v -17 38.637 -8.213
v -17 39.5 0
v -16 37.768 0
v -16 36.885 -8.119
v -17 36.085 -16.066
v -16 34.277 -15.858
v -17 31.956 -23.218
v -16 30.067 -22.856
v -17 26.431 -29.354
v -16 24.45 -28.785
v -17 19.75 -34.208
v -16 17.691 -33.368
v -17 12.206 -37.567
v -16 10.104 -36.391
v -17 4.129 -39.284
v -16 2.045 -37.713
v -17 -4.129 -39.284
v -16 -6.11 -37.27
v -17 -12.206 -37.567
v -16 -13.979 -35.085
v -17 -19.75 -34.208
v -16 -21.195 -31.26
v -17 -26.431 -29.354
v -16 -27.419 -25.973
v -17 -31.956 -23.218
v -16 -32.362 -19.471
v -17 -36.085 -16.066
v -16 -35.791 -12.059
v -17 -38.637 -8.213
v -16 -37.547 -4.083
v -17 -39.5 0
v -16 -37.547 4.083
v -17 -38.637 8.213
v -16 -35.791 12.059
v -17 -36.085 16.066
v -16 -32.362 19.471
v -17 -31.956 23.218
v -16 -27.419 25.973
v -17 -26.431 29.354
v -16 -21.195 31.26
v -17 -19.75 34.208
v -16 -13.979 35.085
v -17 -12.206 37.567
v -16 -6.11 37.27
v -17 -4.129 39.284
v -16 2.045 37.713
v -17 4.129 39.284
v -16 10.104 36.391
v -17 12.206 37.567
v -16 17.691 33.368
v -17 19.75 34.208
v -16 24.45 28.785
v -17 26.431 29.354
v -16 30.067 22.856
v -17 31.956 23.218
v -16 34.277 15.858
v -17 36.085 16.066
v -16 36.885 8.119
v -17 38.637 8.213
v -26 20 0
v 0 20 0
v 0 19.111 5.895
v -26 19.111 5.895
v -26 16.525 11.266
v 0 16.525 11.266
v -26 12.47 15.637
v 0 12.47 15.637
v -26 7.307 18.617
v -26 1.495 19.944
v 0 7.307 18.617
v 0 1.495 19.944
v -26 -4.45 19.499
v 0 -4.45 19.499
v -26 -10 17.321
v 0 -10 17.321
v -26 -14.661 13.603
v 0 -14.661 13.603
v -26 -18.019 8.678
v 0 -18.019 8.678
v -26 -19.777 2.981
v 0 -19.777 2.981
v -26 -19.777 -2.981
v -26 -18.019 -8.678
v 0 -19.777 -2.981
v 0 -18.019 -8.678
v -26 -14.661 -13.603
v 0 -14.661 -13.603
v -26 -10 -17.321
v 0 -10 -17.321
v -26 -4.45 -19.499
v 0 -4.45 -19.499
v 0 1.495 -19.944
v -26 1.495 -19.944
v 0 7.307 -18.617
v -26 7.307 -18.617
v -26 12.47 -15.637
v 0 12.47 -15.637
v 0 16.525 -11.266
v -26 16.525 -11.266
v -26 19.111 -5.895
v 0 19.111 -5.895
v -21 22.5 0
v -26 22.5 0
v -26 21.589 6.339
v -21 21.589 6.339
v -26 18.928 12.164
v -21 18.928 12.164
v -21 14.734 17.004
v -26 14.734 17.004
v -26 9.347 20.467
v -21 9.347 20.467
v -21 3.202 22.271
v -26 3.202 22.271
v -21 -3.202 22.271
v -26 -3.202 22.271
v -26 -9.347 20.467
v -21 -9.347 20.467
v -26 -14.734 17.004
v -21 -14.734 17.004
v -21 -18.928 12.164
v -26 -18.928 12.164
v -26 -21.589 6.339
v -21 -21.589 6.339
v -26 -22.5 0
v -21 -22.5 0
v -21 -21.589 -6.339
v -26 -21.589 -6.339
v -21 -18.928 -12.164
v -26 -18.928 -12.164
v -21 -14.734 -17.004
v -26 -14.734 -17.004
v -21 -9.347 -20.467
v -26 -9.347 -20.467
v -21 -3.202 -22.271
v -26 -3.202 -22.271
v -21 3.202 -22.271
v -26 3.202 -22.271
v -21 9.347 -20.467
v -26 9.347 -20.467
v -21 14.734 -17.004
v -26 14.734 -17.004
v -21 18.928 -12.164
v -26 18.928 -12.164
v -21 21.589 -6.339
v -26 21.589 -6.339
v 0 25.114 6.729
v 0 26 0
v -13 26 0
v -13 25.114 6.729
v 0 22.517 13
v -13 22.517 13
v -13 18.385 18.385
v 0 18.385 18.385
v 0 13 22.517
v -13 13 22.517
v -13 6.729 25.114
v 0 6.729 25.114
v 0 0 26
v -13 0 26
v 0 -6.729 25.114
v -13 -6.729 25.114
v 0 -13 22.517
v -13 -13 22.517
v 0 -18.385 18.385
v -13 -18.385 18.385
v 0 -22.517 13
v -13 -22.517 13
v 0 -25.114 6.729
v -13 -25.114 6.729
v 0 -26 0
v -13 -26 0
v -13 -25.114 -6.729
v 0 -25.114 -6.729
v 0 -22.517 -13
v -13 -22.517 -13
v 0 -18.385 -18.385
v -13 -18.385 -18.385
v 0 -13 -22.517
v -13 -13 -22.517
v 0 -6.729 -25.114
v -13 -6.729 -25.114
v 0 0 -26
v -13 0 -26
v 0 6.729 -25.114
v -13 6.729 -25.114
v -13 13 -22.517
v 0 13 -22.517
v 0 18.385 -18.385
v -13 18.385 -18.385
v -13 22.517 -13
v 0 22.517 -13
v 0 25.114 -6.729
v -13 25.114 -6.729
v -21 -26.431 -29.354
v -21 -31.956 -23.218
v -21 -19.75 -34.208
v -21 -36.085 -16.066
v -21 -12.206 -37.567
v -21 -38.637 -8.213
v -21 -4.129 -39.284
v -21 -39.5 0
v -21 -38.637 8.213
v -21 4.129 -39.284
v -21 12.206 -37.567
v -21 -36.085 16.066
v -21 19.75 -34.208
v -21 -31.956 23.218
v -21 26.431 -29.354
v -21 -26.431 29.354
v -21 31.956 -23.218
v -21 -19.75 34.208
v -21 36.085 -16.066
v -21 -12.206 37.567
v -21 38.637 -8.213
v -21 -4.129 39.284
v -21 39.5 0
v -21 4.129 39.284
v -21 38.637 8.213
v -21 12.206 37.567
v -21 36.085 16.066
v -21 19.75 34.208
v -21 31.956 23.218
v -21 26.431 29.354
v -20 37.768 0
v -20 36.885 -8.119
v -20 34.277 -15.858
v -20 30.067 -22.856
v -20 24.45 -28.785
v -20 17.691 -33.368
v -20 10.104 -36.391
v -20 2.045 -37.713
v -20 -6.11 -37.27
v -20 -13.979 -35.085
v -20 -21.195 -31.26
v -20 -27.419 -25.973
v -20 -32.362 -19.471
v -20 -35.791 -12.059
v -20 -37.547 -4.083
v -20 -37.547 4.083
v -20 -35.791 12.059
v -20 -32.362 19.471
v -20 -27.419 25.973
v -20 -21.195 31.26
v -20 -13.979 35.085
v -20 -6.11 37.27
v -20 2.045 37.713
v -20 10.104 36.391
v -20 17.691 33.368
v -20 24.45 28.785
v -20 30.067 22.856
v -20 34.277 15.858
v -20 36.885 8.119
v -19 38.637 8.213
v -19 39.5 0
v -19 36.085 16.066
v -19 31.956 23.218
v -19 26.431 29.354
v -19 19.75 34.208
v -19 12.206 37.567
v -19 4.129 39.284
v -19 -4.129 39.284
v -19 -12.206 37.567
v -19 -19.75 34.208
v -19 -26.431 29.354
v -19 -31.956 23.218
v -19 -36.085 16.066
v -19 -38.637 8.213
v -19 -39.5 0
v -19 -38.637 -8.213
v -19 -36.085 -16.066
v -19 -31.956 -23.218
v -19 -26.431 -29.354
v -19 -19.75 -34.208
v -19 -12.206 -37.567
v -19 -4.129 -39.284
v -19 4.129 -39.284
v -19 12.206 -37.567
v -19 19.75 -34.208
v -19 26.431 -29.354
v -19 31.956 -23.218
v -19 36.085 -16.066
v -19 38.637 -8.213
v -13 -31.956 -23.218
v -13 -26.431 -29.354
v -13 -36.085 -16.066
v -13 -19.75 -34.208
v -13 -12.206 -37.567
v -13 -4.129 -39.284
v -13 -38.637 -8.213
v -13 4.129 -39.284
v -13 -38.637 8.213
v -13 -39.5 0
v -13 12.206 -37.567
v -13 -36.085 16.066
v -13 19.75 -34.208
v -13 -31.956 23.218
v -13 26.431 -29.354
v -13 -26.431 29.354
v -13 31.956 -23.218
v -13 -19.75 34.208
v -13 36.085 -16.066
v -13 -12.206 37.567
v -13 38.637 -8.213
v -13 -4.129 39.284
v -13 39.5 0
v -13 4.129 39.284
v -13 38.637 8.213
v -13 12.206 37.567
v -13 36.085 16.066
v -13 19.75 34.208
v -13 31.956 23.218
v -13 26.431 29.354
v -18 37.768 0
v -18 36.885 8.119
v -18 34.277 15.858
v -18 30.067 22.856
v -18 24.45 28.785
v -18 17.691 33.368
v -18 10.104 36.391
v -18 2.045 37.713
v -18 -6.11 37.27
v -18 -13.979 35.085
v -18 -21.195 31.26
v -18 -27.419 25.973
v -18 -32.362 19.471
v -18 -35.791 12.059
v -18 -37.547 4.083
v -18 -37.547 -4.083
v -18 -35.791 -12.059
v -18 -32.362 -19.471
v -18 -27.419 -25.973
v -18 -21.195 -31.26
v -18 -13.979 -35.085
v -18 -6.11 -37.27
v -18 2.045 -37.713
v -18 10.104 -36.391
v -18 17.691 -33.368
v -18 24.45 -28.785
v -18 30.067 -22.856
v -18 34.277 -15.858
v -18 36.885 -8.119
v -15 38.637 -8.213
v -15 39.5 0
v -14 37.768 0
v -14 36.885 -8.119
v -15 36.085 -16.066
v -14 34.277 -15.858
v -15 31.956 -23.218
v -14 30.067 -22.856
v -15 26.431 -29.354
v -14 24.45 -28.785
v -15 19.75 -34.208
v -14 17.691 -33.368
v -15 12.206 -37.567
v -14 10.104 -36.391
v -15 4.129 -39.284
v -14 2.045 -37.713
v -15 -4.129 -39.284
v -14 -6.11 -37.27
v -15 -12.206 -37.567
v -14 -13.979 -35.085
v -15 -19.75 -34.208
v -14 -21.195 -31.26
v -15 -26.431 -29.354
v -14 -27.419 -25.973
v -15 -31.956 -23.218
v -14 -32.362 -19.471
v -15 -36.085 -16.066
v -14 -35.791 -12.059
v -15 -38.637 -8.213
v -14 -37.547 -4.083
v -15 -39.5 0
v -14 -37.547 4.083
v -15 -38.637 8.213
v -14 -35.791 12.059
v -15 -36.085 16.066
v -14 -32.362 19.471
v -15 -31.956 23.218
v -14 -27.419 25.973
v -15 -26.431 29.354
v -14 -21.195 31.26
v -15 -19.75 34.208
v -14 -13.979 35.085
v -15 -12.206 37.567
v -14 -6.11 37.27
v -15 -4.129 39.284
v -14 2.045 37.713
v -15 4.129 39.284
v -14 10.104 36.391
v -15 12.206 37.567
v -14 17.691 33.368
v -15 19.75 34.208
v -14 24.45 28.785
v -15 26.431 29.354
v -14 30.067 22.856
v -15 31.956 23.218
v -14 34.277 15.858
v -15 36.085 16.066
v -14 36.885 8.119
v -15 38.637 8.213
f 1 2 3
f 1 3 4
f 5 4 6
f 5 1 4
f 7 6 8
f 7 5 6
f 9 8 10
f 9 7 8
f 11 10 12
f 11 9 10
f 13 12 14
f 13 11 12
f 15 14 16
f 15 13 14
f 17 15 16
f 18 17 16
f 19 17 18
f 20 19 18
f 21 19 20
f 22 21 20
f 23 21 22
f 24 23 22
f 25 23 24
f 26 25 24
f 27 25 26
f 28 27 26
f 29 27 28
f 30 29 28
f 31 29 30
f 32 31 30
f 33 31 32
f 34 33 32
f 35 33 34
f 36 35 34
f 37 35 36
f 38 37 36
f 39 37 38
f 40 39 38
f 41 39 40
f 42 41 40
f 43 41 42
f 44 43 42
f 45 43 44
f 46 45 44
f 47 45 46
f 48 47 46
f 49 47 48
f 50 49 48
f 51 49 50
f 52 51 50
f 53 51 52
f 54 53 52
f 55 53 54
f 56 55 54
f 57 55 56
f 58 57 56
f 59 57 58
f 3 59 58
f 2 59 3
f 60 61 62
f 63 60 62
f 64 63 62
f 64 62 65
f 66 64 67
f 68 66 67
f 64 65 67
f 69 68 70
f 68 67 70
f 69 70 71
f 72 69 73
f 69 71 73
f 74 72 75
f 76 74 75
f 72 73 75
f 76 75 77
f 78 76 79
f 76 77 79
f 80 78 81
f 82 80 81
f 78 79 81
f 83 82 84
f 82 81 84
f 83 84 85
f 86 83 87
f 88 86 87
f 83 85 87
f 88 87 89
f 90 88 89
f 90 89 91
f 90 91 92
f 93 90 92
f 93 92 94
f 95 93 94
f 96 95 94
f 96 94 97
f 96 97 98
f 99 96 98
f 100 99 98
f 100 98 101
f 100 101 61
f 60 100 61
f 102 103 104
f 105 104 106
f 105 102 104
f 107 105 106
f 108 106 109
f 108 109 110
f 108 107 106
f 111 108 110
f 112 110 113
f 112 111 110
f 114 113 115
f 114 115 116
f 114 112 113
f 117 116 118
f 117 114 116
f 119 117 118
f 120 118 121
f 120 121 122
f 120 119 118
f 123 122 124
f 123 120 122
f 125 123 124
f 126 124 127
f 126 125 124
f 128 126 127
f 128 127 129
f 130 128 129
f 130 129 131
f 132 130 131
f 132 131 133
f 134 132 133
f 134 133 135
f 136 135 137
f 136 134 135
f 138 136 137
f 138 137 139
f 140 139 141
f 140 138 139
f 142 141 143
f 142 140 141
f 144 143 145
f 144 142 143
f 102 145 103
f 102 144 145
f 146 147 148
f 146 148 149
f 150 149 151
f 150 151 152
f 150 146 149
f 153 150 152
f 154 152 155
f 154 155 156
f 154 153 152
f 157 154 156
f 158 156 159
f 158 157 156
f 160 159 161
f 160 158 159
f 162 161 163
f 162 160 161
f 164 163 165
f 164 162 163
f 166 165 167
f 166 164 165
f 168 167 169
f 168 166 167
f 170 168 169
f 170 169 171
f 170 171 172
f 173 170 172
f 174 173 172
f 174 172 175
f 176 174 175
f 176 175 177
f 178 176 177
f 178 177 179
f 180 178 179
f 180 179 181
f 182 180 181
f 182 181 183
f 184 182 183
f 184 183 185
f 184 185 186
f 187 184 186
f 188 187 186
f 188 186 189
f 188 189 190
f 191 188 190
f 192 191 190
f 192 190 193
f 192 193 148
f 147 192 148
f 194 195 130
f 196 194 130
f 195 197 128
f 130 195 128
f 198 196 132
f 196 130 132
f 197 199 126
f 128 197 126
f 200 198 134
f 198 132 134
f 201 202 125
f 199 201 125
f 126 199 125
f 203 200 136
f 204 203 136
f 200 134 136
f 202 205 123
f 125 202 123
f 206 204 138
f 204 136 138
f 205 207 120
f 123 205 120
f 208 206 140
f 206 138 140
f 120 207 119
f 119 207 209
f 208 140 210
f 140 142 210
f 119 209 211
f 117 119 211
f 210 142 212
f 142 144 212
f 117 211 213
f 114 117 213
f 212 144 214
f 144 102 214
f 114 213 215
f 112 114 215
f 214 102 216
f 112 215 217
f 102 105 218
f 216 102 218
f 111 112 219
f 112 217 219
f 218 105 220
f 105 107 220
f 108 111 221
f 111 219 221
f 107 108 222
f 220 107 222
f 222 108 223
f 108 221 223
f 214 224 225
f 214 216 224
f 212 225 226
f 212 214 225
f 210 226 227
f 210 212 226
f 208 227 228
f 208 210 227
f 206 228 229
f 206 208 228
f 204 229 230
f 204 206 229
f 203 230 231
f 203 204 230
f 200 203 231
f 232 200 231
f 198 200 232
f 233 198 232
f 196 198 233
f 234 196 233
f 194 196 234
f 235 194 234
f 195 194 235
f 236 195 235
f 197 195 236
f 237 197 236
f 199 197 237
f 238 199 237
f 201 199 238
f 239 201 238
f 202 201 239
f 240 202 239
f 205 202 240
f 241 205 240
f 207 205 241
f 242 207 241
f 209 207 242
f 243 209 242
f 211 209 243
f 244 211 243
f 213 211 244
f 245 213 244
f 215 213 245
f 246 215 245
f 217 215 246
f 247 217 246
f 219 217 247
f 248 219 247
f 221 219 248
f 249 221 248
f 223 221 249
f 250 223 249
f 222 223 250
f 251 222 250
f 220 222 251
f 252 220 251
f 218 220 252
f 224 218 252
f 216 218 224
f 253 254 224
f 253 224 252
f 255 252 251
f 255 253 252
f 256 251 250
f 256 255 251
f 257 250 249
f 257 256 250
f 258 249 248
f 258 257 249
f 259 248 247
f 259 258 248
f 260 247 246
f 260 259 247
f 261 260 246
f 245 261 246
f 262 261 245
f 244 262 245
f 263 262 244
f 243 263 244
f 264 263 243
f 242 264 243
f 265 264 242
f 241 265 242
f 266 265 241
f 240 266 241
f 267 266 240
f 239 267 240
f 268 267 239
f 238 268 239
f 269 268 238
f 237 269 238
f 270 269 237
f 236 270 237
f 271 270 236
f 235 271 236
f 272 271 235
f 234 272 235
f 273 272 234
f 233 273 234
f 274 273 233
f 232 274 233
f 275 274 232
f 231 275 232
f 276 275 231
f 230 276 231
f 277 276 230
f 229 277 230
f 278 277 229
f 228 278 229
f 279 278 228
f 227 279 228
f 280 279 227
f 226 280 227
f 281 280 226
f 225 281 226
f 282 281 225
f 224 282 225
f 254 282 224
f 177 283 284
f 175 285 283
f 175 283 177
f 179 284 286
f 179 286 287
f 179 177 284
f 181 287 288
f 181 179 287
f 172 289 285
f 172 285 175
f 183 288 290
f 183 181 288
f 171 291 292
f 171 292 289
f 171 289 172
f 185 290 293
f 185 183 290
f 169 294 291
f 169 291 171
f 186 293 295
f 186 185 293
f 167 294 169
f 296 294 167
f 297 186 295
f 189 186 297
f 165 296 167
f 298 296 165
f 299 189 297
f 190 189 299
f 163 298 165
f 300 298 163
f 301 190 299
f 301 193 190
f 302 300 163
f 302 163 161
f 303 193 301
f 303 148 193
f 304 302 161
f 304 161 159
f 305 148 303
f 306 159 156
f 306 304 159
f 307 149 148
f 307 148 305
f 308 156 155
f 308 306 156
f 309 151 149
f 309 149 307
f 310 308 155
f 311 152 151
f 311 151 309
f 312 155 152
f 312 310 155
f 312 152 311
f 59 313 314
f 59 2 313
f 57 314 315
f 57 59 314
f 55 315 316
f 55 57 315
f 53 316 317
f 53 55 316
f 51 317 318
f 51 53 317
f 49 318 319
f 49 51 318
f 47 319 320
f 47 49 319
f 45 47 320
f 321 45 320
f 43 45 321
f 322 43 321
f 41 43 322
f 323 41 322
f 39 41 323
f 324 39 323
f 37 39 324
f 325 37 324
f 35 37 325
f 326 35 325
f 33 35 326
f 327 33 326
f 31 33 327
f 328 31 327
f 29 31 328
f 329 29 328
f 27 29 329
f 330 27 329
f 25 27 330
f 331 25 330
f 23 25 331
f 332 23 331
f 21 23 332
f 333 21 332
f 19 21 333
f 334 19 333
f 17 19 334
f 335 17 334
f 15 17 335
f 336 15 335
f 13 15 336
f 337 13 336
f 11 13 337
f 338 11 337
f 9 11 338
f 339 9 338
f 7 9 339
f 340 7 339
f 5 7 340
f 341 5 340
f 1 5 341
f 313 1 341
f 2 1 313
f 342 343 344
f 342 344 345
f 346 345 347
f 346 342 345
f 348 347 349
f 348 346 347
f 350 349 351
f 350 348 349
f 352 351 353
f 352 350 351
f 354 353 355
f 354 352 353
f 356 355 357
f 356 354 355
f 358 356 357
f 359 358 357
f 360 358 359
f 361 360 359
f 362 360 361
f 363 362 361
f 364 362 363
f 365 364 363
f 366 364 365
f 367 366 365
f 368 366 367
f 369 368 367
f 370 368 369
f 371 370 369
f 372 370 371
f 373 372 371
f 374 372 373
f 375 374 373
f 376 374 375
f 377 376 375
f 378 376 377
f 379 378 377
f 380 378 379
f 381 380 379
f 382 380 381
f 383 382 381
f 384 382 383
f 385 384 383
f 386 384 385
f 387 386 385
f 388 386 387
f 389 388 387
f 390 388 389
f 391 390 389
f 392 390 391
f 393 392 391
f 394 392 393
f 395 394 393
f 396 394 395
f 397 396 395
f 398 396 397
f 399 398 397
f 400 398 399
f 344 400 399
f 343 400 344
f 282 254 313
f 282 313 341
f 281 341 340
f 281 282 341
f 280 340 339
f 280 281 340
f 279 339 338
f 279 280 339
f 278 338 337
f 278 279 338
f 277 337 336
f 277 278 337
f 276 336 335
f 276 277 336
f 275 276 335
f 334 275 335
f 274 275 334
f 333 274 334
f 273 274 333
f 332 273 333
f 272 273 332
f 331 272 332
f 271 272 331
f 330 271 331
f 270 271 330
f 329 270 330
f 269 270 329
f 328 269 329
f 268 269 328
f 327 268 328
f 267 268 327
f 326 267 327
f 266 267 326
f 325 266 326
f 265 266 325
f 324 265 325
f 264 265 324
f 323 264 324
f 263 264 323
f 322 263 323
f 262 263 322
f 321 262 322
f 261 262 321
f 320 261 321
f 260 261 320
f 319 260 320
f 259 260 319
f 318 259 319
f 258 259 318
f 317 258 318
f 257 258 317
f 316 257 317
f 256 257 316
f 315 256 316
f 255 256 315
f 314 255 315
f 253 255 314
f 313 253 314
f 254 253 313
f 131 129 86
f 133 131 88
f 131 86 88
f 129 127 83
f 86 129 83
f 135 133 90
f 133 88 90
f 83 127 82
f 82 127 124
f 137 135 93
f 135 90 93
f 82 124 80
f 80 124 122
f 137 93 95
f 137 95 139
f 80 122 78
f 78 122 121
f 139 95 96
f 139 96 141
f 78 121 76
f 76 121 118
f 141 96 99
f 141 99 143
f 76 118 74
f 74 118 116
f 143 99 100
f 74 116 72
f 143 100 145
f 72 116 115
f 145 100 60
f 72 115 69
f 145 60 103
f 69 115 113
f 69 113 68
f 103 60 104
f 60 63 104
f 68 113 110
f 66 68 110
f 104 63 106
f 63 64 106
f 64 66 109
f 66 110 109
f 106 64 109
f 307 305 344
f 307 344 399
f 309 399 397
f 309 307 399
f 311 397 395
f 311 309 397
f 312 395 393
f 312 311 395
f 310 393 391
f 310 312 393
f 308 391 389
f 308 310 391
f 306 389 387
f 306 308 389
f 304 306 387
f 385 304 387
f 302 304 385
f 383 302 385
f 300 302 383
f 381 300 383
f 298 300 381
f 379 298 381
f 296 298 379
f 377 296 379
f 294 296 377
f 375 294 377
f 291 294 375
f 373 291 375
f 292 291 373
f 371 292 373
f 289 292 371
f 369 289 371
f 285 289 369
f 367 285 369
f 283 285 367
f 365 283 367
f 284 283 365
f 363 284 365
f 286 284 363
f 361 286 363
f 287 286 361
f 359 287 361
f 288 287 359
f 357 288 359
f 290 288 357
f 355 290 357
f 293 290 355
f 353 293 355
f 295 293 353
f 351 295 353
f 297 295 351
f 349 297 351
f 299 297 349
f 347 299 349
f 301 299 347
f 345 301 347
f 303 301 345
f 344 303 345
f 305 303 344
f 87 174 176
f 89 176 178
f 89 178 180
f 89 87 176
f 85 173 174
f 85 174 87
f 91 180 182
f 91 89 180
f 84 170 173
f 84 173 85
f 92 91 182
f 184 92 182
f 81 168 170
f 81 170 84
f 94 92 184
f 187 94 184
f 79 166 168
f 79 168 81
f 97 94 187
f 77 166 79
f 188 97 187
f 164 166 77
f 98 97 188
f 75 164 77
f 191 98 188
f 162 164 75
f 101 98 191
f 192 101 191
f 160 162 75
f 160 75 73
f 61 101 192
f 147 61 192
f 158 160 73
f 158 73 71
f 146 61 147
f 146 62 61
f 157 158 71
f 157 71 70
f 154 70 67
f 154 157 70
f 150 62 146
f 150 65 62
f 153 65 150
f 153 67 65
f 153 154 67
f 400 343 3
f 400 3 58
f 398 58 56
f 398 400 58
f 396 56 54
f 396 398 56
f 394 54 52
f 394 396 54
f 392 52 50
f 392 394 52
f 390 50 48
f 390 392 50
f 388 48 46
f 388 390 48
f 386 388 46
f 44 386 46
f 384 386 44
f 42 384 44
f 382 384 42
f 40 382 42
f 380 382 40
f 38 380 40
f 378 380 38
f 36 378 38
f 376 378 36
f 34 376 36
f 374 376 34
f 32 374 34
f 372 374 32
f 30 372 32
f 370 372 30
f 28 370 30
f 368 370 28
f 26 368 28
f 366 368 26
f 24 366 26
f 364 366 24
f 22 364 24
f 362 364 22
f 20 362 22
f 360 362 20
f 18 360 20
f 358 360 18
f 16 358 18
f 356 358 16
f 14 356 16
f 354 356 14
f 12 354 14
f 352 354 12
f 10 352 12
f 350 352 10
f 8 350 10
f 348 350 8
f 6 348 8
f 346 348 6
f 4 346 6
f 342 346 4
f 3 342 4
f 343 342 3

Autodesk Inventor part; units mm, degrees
ref_plane "YZ Plane" through (0, 0, 0) normal (1, 0, 0) x (0, 1, 0)
ref_plane "XZ Plane" through (0, 0, 0) normal (0, 1, 0) x (-1, 0, 0)
ref_plane "XY Plane" through (0, 0, 0) normal (0, 0, 1) x (1, 0, 0)
sketch "草图1" plane through (0, 0, 0) normal (0, 0, 1) x (1, 0, 0)
  line L0 (-31.2, 0) -> (5.2, 0) construction
  line L1 (0, -36.4) -> (0, 36.4) construction
  line L2 (-26, 22.5) -> (-13, 22.5)
  line L3 (-13, -22.5) -> (-26, -22.5)
  line L4 (-26, -22.5) -> (-26, 22.5)
  line L5 (-13, 26) -> (0, 26)
  line L6 (0, 26) -> (0, -26)
  line L7 (0, -26) -> (-13, -26)
  line L8 (-13, -26) -> (-13, -22.5)
  line L9 (-13, 22.5) -> (-13, 26)
  line L10 (-26, 20) -> (0, 20)
  line L11 (0, 20) -> (0, -20)
  line L12 (0, -20) -> (-26, -20)
  line L13 (-26, -20) -> (-26, 20)
  point P0 (0, 0)
  point P1 (0, 20)
  dimension "d0" = 26
  dimension "d1" = 13
  dimension "d2" = 45
  dimension "d3" = 52
  dimension "d4" = 40
revolve "旋转1" add sketch "草图1" angle 360 about axis through (-10, 0, 0) along (1, 0, 0) contours L2 L9 L5 L6 L10 L4
sketch "草图2" plane through (0, 0, 0) normal (0, 0, 1) x (1, 0, 0)
  line L0 (-26, -22.5) -> (-26, 22.5) construction
  line L1 (-13, -22.5) -> (-13, 22.5) construction
  line L2 (-26, 22.5) -> (-13, 22.5) construction
  line L3 (-26, -22.5) -> (-13, -22.5) construction
  line L4 (-21, 39.5) -> (-13, 39.5)
  line L5 (-13, 39.5) -> (-13, -39.5)
  line L6 (-13, -39.5) -> (-21, -39.5)
  line L7 (-21, -39.5) -> (-21, 39.5)
  line L8 (-81.7478, 0) -> (13.6246, 0) construction
  line L9 (-21, 22.5) -> (-13, 22.5)
  line L10 (-21, 39.5) -> (-20, 37.7679)
  line L11 (-20, 37.7679) -> (-19, 39.5)
  line L12 (-19, 39.5) -> (-18, 37.7679)
  line L13 (-18, 37.7679) -> (-17, 39.5)
  line L14 (-17, 39.5) -> (-16, 37.7679)
  line L15 (-16, 37.7679) -> (-15, 39.5)
  line L16 (-15, 39.5) -> (-14, 37.7679)
  line L17 (-14, 37.7679) -> (-13, 39.5)
  point P0 (0, 0)
  dimension "d6" = 8
  dimension "d7" = 79
  dimension "d8" = 60
  dimension "d9" = 2
  dimension "d10" = 2
revolve "旋转2" add sketch "草图2" angle 360 about axis through (-10, 0, 0) along (1, 0, 0) contours L10 L11 L12 L13 L14 L15 L16 L17 L5 L9 L7
properties part number "轴套1"
